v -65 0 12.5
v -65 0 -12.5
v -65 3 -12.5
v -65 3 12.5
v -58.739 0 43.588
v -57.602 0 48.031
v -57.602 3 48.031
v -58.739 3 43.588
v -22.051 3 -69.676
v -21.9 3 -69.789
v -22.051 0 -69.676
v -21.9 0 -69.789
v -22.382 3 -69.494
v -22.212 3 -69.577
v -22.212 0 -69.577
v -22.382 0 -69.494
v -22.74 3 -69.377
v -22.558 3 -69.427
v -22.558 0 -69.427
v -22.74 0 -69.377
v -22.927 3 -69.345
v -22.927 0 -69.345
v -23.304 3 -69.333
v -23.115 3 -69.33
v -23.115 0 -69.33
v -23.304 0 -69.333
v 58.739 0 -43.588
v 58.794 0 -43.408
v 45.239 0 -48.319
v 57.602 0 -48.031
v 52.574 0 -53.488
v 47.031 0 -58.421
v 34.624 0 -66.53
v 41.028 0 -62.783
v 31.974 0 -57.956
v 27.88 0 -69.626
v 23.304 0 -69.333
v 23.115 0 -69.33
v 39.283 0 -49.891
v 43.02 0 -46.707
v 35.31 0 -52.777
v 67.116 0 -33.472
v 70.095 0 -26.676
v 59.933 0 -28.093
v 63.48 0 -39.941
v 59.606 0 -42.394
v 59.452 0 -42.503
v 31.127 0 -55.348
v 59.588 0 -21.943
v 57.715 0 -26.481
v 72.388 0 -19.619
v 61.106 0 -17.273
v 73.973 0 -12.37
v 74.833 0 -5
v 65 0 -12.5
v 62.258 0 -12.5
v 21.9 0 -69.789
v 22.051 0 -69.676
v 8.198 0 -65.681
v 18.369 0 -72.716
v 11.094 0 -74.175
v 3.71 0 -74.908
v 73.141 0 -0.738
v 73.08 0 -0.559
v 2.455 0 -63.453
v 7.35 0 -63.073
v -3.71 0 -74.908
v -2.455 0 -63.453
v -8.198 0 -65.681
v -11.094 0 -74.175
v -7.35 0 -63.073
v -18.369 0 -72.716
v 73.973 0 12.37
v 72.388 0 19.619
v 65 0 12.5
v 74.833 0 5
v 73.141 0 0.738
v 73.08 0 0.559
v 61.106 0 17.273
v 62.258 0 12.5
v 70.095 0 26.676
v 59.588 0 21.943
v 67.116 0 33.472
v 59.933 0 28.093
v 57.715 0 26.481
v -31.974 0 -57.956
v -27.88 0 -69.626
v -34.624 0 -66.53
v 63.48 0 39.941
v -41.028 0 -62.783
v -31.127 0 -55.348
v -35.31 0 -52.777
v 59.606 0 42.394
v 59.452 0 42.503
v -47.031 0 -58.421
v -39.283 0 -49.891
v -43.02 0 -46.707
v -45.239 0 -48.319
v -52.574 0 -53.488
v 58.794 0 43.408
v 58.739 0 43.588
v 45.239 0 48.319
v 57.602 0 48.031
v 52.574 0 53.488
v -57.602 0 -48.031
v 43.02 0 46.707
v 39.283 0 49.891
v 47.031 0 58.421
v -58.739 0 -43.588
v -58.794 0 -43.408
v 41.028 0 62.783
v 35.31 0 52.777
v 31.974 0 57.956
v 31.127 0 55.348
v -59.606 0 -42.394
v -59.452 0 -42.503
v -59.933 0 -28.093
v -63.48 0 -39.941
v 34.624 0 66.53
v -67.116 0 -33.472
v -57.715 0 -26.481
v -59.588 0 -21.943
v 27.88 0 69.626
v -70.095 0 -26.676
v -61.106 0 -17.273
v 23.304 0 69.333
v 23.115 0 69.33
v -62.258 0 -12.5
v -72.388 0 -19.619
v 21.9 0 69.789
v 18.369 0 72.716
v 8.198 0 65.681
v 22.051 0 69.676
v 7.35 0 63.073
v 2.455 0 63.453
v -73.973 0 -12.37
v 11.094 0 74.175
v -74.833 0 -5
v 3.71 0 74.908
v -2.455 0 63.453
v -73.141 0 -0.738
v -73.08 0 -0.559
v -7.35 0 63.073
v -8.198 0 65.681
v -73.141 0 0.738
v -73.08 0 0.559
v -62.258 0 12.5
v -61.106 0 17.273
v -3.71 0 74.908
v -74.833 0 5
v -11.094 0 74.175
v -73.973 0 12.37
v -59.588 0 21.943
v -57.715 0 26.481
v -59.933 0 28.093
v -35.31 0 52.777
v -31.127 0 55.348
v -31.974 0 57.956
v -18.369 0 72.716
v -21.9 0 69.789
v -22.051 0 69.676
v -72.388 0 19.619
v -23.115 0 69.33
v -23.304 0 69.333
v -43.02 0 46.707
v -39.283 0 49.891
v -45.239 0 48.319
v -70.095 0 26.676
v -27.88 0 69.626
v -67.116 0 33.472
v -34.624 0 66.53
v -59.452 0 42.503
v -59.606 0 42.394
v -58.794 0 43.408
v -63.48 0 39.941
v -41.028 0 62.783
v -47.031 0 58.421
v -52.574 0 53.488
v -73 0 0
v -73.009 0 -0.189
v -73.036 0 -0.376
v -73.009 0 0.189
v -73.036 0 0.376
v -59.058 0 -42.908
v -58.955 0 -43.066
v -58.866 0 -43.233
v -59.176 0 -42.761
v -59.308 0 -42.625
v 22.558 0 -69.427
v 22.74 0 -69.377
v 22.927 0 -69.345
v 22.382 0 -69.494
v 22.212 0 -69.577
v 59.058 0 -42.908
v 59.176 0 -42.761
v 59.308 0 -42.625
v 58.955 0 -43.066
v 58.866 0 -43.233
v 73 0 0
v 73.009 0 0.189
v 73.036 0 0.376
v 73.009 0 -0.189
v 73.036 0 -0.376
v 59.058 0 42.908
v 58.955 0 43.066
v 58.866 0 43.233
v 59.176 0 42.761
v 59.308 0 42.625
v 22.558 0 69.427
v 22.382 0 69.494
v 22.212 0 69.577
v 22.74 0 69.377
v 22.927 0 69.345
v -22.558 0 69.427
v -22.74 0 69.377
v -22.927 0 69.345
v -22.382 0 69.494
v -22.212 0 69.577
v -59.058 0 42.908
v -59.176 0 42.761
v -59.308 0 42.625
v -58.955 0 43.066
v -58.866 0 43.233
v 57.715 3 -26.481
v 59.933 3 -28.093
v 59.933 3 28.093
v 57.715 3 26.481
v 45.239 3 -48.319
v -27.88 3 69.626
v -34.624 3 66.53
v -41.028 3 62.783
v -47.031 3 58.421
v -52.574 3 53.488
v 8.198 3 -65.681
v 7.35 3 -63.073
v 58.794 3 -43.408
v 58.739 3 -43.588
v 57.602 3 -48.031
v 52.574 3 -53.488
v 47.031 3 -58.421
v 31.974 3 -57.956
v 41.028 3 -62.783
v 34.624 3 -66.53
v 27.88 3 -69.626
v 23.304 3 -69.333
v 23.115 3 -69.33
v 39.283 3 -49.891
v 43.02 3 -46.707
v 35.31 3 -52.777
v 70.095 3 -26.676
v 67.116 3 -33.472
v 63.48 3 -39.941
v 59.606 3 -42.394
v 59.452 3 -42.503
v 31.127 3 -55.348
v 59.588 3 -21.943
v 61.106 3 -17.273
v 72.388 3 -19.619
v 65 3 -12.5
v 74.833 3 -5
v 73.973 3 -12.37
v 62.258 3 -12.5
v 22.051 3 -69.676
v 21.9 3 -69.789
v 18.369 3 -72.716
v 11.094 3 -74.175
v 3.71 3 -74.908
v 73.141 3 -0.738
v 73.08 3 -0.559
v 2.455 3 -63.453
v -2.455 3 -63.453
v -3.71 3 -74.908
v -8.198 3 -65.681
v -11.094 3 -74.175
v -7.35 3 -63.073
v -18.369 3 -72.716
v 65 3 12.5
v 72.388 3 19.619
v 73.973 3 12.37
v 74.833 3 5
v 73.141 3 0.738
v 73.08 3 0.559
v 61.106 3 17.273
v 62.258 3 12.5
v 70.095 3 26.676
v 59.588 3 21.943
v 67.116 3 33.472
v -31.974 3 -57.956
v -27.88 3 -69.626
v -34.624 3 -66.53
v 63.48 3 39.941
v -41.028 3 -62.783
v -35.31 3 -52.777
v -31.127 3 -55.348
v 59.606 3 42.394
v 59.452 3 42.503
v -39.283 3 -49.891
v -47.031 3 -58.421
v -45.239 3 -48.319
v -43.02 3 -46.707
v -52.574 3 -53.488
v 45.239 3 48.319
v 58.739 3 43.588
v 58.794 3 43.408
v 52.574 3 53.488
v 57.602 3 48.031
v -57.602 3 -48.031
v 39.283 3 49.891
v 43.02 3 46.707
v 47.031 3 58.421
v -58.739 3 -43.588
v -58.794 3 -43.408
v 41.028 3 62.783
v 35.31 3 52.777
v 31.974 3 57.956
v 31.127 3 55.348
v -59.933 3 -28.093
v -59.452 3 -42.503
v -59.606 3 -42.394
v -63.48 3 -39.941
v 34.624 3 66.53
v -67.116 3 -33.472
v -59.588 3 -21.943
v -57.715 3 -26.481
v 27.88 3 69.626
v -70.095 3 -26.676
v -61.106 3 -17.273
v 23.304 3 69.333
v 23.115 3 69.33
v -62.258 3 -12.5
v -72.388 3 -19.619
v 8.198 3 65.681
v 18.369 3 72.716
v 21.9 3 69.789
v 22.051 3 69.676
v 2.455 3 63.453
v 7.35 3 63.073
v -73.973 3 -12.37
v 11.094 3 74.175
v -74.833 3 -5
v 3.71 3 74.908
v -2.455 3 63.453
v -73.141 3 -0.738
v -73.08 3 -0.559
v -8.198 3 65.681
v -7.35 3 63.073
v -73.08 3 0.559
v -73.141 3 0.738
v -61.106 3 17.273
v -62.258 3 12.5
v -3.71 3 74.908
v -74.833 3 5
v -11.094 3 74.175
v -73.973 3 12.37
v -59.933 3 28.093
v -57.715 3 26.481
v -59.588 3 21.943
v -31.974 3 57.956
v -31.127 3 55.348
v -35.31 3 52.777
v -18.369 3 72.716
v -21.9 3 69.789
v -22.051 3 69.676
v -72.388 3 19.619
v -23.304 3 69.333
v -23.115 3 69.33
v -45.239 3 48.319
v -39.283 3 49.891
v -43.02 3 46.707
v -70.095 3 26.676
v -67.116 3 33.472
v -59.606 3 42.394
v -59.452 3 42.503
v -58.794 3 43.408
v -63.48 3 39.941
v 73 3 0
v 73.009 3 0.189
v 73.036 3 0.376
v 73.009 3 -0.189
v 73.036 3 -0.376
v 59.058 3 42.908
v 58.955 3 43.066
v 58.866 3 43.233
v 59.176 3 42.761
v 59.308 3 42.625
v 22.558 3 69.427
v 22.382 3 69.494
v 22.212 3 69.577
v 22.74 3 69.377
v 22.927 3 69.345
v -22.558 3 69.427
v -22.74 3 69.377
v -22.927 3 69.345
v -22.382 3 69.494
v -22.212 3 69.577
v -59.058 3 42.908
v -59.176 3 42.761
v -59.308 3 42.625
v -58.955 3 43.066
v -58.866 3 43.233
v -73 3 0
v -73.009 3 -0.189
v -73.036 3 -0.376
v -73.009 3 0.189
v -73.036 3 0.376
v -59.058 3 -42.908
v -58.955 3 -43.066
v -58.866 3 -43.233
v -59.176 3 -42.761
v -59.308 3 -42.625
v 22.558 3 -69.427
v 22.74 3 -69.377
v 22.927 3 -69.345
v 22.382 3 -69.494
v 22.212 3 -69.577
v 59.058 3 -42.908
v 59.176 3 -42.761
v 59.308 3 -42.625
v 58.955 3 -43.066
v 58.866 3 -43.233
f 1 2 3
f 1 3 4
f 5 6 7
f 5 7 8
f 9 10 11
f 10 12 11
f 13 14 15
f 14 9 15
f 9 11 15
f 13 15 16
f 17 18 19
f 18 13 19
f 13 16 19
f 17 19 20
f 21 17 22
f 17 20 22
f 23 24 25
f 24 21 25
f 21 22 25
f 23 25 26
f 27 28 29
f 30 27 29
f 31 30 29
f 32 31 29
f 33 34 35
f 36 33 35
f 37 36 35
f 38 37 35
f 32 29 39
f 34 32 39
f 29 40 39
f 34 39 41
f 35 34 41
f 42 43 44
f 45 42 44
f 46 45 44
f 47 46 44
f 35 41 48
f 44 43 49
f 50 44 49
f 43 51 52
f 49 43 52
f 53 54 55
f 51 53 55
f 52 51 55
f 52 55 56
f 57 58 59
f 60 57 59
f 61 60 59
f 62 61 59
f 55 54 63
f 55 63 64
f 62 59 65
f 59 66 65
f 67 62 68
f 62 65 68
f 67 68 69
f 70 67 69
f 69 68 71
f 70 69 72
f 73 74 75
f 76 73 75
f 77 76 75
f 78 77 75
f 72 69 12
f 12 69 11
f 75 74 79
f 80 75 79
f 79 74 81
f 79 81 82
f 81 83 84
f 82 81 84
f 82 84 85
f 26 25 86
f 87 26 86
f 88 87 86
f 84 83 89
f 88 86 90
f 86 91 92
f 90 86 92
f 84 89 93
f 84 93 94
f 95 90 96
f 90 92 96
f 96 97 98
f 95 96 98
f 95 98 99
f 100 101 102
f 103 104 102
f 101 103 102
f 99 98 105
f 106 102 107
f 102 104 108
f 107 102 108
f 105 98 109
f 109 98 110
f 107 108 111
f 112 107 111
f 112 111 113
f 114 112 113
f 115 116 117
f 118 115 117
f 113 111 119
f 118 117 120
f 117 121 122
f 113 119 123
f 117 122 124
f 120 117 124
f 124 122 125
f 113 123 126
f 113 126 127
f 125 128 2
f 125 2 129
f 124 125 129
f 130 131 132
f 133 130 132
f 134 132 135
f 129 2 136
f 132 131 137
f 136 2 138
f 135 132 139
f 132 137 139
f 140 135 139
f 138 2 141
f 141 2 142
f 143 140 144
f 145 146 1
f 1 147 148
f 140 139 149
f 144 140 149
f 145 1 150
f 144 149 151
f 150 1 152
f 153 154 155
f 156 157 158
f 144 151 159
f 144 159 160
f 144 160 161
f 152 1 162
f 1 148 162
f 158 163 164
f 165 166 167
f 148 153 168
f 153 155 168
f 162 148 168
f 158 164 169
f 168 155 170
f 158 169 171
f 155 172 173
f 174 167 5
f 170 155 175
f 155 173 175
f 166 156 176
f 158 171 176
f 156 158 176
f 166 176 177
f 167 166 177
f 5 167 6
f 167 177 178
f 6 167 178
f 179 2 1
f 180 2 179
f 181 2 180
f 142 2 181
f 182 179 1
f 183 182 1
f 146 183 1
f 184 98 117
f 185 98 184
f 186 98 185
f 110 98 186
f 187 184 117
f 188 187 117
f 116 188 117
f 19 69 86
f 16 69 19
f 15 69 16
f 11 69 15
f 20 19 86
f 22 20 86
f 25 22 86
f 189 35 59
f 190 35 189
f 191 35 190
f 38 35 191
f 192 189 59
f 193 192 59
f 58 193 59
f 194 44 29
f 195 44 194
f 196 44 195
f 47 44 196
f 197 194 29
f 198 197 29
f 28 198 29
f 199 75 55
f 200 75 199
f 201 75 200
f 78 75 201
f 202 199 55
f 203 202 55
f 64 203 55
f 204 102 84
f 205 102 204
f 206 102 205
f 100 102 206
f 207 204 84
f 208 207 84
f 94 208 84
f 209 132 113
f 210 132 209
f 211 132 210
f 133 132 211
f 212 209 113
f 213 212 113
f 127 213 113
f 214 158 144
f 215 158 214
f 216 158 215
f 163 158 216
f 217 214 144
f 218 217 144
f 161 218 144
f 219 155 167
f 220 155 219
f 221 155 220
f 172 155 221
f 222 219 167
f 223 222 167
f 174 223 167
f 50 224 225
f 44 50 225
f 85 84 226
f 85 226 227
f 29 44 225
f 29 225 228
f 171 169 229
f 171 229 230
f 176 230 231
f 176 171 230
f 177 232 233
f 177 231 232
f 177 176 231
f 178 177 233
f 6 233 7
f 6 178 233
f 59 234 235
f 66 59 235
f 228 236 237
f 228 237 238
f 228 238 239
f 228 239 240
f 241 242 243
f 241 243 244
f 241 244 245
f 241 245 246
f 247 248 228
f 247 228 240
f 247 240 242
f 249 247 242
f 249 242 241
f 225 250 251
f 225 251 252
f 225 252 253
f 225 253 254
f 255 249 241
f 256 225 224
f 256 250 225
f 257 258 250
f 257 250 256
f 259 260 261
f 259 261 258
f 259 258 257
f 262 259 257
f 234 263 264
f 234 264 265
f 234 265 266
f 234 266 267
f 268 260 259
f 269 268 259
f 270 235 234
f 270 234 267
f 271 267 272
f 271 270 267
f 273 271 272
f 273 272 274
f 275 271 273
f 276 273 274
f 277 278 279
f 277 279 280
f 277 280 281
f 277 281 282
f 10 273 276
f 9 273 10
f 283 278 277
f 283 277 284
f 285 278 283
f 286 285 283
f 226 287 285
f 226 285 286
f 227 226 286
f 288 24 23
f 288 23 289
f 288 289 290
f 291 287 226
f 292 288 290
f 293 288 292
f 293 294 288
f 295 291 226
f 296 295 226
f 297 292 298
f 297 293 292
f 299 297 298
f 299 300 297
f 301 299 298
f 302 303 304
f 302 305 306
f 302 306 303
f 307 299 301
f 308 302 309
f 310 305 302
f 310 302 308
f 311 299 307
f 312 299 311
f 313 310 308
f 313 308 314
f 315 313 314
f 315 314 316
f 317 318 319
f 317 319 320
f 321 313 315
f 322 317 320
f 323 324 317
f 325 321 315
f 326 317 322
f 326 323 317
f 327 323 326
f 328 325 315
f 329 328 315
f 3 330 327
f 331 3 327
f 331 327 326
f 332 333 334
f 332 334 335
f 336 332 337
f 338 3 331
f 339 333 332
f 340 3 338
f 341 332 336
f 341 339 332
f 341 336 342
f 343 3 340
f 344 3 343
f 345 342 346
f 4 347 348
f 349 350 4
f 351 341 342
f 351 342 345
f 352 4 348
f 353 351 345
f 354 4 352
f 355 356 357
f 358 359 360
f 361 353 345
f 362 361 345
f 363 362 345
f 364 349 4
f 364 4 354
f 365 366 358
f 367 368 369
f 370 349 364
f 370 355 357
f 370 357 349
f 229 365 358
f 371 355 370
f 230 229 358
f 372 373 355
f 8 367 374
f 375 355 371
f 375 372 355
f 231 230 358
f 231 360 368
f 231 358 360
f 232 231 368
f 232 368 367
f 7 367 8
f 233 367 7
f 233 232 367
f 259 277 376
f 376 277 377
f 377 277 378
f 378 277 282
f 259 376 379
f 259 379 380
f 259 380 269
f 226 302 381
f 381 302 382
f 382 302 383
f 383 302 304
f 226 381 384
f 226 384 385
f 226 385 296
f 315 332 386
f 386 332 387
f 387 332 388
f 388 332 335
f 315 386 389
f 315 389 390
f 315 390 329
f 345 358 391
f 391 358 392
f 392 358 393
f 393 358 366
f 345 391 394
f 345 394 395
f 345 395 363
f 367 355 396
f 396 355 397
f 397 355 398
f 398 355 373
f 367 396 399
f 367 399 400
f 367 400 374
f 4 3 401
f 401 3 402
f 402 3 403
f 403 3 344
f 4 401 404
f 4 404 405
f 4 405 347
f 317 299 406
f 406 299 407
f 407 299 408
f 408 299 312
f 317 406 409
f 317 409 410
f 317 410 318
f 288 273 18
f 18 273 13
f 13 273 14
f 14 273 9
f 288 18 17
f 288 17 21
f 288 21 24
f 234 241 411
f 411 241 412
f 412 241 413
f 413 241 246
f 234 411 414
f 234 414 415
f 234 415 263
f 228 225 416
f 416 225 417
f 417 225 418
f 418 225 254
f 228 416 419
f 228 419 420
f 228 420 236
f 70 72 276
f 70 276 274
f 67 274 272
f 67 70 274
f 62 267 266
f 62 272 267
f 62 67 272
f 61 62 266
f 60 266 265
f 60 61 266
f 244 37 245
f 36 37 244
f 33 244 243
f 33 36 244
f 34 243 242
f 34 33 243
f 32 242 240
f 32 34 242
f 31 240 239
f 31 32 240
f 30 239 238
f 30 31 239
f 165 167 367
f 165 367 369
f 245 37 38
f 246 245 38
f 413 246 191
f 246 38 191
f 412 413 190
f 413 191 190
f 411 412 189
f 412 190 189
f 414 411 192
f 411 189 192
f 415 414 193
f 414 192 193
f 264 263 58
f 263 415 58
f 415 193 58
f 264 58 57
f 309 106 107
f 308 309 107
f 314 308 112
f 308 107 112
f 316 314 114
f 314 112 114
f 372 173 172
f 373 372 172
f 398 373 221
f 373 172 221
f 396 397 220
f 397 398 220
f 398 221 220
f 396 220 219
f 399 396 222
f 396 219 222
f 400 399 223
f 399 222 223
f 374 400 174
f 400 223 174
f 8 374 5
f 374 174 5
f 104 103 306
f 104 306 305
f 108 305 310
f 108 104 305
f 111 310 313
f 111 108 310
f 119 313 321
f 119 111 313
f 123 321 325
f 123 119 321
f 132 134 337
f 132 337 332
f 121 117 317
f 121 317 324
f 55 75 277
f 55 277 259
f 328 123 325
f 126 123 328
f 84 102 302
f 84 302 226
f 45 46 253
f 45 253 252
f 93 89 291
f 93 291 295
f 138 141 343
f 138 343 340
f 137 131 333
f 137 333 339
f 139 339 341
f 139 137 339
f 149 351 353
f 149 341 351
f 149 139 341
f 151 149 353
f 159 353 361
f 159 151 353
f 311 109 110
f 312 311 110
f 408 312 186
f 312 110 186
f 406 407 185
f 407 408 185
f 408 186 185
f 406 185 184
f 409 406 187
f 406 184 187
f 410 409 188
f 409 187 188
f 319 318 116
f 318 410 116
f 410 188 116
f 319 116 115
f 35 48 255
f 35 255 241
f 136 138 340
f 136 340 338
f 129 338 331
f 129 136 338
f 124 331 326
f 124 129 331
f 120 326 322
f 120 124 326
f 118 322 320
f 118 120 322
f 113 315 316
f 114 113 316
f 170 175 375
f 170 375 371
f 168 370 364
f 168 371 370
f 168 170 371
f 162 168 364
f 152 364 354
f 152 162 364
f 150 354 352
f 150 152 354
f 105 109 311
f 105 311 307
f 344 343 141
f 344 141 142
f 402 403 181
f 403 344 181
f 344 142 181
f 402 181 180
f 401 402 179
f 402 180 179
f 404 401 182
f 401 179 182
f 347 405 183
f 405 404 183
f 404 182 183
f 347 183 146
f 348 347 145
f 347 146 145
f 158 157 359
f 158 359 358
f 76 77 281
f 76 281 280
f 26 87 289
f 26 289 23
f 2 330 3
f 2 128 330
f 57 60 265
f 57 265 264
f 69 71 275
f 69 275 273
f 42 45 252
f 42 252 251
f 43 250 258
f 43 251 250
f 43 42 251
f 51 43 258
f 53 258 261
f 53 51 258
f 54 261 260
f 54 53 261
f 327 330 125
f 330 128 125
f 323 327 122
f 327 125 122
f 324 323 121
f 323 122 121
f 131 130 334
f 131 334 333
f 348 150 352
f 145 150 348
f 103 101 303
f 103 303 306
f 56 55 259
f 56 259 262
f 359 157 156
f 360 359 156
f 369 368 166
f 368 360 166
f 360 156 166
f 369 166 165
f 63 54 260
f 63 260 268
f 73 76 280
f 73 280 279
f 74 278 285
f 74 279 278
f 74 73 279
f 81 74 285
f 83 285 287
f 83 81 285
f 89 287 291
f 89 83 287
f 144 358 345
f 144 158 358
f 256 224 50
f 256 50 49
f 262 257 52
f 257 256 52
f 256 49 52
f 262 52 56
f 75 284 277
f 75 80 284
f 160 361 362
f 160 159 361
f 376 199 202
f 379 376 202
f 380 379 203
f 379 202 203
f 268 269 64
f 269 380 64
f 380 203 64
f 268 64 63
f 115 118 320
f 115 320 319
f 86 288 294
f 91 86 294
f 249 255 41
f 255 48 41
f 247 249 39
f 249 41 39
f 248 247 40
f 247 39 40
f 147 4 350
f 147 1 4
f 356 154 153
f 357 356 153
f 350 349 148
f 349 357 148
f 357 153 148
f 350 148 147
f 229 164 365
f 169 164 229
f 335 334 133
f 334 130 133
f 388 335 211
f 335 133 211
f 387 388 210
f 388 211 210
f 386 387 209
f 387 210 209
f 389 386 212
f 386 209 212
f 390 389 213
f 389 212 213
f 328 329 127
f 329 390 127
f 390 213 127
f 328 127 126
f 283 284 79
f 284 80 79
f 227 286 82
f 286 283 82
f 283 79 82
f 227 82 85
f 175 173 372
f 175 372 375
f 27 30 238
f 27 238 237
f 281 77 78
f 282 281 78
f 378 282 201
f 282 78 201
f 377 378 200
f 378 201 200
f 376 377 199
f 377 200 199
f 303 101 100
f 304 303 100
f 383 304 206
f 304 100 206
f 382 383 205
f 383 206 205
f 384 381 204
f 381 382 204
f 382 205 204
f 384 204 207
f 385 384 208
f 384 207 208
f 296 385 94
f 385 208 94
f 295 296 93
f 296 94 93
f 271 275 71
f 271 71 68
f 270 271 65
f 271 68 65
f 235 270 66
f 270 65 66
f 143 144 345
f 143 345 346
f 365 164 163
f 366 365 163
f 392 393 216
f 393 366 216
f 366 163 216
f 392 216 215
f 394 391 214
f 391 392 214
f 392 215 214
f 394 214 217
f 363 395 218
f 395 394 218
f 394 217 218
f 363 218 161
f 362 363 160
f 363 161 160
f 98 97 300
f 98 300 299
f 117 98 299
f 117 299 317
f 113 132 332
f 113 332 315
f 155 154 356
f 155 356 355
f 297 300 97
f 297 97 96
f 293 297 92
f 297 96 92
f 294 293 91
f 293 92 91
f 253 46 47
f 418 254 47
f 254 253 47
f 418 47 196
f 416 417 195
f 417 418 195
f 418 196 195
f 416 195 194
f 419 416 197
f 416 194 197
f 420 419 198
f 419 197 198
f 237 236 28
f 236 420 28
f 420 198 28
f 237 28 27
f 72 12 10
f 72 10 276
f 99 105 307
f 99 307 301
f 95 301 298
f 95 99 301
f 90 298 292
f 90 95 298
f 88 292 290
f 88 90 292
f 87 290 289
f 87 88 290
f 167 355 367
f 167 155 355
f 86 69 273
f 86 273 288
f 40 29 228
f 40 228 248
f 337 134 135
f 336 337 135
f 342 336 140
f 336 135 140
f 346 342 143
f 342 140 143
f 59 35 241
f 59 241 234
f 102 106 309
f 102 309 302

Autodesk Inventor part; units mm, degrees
ref_plane "YZ Plane" through (0, 0, 0) normal (1, 0, 0) x (0, 1, 0)
ref_plane "XZ Plane" through (0, 0, 0) normal (0, 1, 0) x (-1, 0, 0)
ref_plane "XY Plane" through (0, 0, 0) normal (0, 0, 1) x (1, 0, 0)
sketch "Sketch1" plane through (0, 0, 0) normal (0, 1, 0) x (-1, 0, 0)
  circle A0 centre (0, 0) radius 75
  circle A1 centre (0, 0) radius 63.5
  line L0 (62, 12.5) -> (62, -12.5)
  line L1 (62, -12.5) -> (65, -12.5)
  line L2 (65, -12.5) -> (65, 12.5)
  line L3 (65, 12.5) -> (62, 12.5)
  line L4 (62, 12.5) -> (65, -12.5) construction
  line L5 (62, -12.5) -> (65, 12.5) construction
  line L6 (75, 0) -> (0, 0) construction
  line L7 (59.9334, 28.0933) -> (45.2388, 48.3188)
  line L8 (45.2388, 48.3188) -> (42.8117, 46.5554)
  line L9 (42.8117, 46.5554) -> (57.5064, 26.33)
  line L10 (57.5064, 26.33) -> (59.9334, 28.0933)
  line L11 (31.9743, 57.956) -> (8.1979, 65.6814)
  line L12 (8.1979, 65.6814) -> (7.2708, 62.8282)
  line L13 (7.2708, 62.8282) -> (31.0473, 55.1028)
  line L14 (31.0473, 55.1028) -> (31.9743, 57.956)
  line L15 (-8.1979, 65.6814) -> (-31.9743, 57.956)
  line L16 (-31.9743, 57.956) -> (-31.0473, 55.1028)
  line L17 (-31.0473, 55.1028) -> (-7.2708, 62.8282)
  line L18 (-7.2708, 62.8282) -> (-8.1979, 65.6814)
  line L19 (-45.2388, 48.3188) -> (-59.9334, 28.0933)
  line L20 (-59.9334, 28.0933) -> (-57.5064, 26.33)
  line L21 (-57.5064, 26.33) -> (-42.8117, 46.5554)
  line L22 (-42.8117, 46.5554) -> (-45.2388, 48.3188)
  line L23 (-65, 12.5) -> (-65, -12.5)
  line L24 (-65, -12.5) -> (-62, -12.5)
  line L25 (-62, -12.5) -> (-62, 12.5)
  line L26 (-62, 12.5) -> (-65, 12.5)
  line L27 (-59.9334, -28.0933) -> (-45.2388, -48.3188)
  line L28 (-45.2388, -48.3188) -> (-42.8117, -46.5554)
  line L29 (-42.8117, -46.5554) -> (-57.5064, -26.33)
  line L30 (-57.5064, -26.33) -> (-59.9334, -28.0933)
  line L31 (-31.9743, -57.956) -> (-8.1979, -65.6814)
  line L32 (-8.1979, -65.6814) -> (-7.2708, -62.8282)
  line L33 (-7.2708, -62.8282) -> (-31.0473, -55.1028)
  line L34 (-31.0473, -55.1028) -> (-31.9743, -57.956)
  line L35 (8.1979, -65.6814) -> (31.9743, -57.956)
  line L36 (31.9743, -57.956) -> (31.0473, -55.1028)
  line L37 (31.0473, -55.1028) -> (7.2708, -62.8282)
  line L38 (7.2708, -62.8282) -> (8.1979, -65.6814)
  line L39 (45.2388, -48.3188) -> (59.9334, -28.0933)
  line L40 (59.9334, -28.0933) -> (57.5064, -26.33)
  line L41 (57.5064, -26.33) -> (42.8117, -46.5554)
  line L42 (42.8117, -46.5554) -> (45.2388, -48.3188)
  circle A2 centre (75, 0) radius 2
  line L43 (74.8331, 5) -> (73.1411, 0.738)
  line L44 (73.1411, -0.738) -> (74.8331, -5)
  circle A3 centre (60.6763, 44.0839) radius 2
  line L45 (57.6024, 48.0309) -> (58.7386, 43.5883)
  line L46 (59.6062, 42.3942) -> (63.4802, 39.9407)
  circle A4 centre (23.1763, 71.3292) radius 2
  line L47 (18.3694, 72.7156) -> (21.9, 69.7894)
  line L48 (23.3037, 69.3333) -> (27.88, 69.6255)
  circle A5 centre (-23.1763, 71.3292) radius 2
  line L49 (-27.88, 69.6255) -> (-23.3037, 69.3333)
  line L50 (-21.9, 69.7894) -> (-18.3694, 72.7156)
  circle A6 centre (-60.6763, 44.0839) radius 2
  line L51 (-63.4802, 39.9407) -> (-59.6062, 42.3942)
  line L52 (-58.7386, 43.5883) -> (-57.6024, 48.0309)
  circle A7 centre (-75, 0) radius 2
  line L53 (-74.8331, -5) -> (-73.1411, -0.738)
  line L54 (-73.1411, 0.738) -> (-74.8331, 5)
  circle A8 centre (-60.6763, -44.0839) radius 2
  line L55 (-57.6024, -48.0309) -> (-58.7386, -43.5883)
  line L56 (-59.6062, -42.3942) -> (-63.4802, -39.9407)
  circle A9 centre (-23.1763, -71.3292) radius 2
  line L57 (-18.3694, -72.7156) -> (-21.9, -69.7894)
  line L58 (-23.3037, -69.3333) -> (-27.88, -69.6255)
  circle A10 centre (23.1763, -71.3292) radius 2
  line L59 (27.88, -69.6255) -> (23.3037, -69.3333)
  line L60 (21.9, -69.7894) -> (18.3694, -72.7156)
  circle A11 centre (60.6763, -44.0839) radius 2
  line L61 (63.4802, -39.9407) -> (59.6062, -42.3942)
  line L62 (58.7386, -43.5883) -> (57.6024, -48.0309)
  point P0 (63.5, 0)
  point P1 (63.5, 0)
  point P2 (62.2575, -12.5)
  point P3 (57.7147, -26.4813)
  point P4 (43.0201, -46.7068)
  point P5 (31.1268, -55.3477)
  point P6 (7.3504, -63.0731)
  point P7 (-7.3504, -63.0731)
  point P8 (-31.1268, -55.3477)
  point P9 (-43.0201, -46.7068)
  point P10 (-57.7147, -26.4813)
  point P11 (-62.2575, -12.5)
  point P12 (-62.2575, 12.5)
  point P13 (-57.7147, 26.4813)
  point P14 (-43.0201, 46.7068)
  point P15 (-31.1268, 55.3477)
  point P16 (-7.3504, 63.0731)
  point P17 (7.3504, 63.0731)
  point P18 (31.1268, 55.3477)
  point P19 (43.0201, 46.7068)
  point P20 (57.7147, 26.4813)
  point P21 (62.2575, 12.5)
  point P22 (65, 0)
  dimension "d1" = 127
  dimension "d2" = 25
  dimension "d3" = 3
  dimension "d6" = 360
  dimension "d11" = 4
  dimension "d12" = 10
  dimension "d13" = 5
  dimension "d15" = 10
  dimension "d16" = 150
  dimension "d19" = 360
extrude "Extrusion1" add sketch "Sketch1" along normal blind 3 contours L43 A2 L44 A0 L61 A11 L62 L59 A10 L60 L57 A9 L58 L55 A8 L56 L53 A7 L54 L51 A6 L52 L49 A5 L50 L47 A4 L48 L45 A3 L46
properties part number "lamina_rotor"
